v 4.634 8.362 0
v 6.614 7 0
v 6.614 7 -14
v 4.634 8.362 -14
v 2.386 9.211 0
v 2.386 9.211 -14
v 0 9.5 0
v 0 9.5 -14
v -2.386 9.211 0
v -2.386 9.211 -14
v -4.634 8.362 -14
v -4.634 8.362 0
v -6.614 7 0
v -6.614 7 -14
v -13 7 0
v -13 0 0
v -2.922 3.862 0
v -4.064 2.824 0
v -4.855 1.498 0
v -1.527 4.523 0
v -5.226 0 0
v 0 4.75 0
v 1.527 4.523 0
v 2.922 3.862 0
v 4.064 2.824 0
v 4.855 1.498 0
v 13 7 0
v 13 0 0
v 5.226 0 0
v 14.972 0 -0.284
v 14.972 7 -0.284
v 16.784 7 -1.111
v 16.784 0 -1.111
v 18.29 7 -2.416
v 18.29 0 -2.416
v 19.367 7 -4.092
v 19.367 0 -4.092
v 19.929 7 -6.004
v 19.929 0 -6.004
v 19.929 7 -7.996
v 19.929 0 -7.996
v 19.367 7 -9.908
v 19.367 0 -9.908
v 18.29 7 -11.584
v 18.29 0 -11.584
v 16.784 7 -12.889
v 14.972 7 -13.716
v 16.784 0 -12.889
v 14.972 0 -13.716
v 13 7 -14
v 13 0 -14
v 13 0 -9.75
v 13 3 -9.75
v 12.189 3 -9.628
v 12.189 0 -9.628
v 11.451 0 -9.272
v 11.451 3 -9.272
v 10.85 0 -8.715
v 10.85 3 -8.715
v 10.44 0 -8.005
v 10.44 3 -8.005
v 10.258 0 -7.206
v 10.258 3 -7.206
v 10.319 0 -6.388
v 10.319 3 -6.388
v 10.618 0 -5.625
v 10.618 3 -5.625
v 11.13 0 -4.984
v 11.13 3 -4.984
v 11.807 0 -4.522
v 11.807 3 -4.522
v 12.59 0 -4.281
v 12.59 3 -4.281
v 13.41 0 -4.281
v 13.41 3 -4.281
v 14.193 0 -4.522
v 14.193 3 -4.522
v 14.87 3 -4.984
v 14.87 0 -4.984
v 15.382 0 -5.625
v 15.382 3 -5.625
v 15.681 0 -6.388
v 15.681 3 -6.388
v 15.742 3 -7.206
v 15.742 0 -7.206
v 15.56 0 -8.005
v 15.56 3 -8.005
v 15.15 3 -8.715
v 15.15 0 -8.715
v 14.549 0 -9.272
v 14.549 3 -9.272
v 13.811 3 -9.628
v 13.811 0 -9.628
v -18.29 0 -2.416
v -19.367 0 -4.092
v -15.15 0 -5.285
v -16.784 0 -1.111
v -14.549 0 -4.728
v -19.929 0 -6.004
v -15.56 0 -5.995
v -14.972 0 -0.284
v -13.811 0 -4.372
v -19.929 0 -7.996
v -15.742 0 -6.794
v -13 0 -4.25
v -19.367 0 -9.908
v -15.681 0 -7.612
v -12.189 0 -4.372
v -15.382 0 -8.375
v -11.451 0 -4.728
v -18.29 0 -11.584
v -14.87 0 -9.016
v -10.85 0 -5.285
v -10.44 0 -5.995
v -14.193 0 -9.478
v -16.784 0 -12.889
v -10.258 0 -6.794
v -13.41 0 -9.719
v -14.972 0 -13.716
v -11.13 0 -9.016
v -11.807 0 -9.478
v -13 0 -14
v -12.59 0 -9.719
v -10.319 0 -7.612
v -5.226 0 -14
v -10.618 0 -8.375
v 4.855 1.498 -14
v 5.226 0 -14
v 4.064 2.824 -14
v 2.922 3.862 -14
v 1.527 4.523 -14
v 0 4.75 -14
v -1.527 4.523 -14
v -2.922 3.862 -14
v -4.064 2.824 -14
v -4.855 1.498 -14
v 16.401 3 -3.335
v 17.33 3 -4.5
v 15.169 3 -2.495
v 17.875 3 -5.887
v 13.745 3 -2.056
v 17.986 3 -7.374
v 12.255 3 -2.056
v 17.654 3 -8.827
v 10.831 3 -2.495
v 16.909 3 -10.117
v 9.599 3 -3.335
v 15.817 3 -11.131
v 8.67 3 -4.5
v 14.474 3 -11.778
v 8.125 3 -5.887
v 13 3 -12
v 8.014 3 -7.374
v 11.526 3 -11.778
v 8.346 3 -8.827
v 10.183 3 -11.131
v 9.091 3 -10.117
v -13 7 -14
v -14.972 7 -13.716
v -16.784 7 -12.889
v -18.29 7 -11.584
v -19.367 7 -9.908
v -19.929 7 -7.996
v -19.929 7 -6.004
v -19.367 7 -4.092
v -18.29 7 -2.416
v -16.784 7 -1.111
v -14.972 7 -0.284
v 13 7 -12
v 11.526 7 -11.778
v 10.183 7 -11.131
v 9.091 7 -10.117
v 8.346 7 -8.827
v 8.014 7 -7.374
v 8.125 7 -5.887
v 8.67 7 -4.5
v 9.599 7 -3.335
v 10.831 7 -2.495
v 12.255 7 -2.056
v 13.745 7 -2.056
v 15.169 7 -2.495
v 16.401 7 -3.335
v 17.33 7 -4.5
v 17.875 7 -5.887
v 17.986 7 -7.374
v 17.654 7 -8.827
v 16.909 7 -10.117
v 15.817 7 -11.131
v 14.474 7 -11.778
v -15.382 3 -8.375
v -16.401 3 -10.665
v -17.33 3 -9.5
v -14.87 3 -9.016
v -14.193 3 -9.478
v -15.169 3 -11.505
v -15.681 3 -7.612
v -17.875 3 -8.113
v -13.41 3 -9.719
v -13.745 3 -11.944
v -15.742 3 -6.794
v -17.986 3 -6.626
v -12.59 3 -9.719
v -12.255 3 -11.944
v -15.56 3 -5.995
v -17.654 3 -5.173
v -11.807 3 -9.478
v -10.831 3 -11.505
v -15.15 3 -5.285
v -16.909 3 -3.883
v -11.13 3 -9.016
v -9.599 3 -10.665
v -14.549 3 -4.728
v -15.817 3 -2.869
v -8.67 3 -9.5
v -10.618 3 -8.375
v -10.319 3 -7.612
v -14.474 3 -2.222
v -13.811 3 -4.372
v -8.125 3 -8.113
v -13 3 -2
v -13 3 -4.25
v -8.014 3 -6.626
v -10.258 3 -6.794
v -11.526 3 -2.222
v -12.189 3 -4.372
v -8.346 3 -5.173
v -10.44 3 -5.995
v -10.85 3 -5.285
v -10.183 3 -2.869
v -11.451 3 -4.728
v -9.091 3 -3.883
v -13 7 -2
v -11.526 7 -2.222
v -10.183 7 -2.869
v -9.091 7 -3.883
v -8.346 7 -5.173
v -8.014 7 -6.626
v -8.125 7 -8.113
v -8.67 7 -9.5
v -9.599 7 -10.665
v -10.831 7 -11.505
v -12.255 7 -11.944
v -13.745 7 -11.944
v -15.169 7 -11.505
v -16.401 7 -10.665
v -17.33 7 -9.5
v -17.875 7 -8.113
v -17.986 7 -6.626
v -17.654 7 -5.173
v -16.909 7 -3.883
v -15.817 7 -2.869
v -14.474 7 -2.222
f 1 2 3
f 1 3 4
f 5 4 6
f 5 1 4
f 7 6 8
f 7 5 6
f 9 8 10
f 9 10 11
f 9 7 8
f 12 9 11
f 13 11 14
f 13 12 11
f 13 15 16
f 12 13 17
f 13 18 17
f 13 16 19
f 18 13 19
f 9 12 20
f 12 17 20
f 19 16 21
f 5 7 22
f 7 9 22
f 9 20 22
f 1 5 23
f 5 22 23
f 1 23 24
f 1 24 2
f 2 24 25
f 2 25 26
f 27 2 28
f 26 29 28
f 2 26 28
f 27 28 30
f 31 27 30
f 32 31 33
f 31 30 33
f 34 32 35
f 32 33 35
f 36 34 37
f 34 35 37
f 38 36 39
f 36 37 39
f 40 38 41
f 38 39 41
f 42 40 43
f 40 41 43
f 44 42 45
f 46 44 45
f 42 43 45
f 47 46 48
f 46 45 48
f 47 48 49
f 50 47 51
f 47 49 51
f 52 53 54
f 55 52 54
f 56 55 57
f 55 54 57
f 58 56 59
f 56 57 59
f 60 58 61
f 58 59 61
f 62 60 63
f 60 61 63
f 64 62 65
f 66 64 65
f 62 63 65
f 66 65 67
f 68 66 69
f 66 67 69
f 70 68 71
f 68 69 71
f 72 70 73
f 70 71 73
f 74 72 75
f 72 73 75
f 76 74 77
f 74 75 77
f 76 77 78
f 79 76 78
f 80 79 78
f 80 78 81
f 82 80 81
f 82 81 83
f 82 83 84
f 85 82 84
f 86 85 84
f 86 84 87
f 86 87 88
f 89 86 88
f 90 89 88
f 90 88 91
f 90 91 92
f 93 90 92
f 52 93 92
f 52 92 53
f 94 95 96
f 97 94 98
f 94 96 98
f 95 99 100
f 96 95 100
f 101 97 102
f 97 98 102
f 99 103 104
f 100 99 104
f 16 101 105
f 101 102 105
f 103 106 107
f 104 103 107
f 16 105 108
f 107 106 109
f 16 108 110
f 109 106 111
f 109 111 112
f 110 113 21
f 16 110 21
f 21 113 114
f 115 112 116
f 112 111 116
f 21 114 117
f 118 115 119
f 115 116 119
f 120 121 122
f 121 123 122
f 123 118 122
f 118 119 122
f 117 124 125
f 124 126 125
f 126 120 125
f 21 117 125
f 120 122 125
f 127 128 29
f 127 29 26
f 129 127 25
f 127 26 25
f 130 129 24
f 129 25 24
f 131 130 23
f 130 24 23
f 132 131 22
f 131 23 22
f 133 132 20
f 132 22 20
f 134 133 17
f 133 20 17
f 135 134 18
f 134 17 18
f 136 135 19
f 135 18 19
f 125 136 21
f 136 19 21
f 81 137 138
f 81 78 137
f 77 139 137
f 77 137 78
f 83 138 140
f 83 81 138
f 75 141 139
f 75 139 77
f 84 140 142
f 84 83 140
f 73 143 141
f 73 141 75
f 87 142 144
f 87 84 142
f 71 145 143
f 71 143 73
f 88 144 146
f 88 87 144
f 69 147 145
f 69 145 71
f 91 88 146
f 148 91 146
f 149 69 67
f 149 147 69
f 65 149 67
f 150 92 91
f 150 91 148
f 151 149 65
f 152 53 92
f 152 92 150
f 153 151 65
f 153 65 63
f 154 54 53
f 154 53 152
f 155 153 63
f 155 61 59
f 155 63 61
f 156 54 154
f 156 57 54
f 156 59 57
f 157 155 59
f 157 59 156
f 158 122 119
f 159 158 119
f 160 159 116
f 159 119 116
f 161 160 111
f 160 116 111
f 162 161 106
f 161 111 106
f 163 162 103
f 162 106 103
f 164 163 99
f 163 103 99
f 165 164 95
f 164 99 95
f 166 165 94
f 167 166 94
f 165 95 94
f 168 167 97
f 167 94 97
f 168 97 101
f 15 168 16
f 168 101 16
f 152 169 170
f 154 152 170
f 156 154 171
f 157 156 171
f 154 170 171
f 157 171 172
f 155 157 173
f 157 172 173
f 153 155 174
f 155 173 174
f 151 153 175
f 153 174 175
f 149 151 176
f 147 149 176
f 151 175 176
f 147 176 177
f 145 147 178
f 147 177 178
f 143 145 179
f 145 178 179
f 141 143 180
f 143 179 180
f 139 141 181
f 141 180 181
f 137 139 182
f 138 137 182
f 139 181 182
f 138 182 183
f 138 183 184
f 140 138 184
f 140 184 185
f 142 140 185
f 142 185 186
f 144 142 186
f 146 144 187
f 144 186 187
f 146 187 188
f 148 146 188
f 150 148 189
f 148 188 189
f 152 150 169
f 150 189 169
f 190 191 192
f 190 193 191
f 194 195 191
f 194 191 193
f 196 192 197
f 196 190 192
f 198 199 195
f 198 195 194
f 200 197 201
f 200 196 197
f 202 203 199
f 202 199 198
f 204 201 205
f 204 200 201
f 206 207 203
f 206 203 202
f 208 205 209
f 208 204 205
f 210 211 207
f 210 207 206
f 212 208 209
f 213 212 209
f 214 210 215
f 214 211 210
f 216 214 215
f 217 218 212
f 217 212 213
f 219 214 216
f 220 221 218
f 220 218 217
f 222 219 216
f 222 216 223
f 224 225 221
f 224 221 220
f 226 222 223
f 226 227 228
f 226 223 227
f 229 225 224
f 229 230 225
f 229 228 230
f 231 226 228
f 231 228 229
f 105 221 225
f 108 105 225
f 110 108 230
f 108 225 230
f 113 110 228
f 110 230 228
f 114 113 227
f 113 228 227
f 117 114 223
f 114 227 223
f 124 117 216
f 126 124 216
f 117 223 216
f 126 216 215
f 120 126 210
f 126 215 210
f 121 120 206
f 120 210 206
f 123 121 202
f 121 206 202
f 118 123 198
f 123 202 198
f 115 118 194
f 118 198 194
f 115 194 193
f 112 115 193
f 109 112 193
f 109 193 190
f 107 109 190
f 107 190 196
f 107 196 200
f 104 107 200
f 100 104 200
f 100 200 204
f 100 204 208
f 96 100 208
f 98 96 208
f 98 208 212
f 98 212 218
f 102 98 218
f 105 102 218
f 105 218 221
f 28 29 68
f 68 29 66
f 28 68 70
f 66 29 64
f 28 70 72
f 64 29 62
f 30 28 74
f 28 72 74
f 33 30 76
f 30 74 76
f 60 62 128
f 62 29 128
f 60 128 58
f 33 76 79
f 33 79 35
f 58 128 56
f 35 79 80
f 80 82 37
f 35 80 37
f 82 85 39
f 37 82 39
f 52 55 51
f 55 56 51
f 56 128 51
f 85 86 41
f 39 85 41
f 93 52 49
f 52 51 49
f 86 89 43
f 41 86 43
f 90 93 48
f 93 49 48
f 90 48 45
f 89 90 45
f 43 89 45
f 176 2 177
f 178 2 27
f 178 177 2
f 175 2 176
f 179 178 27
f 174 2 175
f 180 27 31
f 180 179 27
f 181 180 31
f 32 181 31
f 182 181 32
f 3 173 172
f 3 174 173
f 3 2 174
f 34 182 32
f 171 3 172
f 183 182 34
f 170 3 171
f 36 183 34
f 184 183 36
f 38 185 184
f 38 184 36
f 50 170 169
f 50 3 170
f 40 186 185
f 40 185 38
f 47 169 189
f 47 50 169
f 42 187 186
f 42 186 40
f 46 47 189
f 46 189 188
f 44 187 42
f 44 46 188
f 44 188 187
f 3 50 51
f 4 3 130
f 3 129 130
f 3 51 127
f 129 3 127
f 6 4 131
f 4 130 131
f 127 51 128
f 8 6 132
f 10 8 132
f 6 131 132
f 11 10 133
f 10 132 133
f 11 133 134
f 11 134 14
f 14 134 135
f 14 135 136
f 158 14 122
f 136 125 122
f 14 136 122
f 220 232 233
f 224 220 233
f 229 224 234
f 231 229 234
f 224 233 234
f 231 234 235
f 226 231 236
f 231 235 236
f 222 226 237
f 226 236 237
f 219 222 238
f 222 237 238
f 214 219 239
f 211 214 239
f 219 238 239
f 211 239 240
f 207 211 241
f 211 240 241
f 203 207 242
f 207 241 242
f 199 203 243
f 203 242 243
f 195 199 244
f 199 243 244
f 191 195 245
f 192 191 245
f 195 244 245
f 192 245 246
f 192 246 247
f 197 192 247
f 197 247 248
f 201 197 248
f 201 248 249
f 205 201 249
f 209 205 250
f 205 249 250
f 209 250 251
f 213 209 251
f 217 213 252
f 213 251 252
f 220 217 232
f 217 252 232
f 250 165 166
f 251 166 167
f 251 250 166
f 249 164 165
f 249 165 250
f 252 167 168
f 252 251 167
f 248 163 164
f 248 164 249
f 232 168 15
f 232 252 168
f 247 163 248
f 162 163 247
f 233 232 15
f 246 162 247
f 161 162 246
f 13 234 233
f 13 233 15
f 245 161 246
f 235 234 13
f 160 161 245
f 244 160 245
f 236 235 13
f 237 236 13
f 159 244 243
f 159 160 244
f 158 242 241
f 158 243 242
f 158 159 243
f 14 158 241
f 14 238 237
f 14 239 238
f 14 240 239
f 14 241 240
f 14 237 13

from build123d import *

# Parameters (mm, degrees)
BOSS_EXTRUDE1_DEPTH = 7
SKETCH2_R           = 2.75
CUT_EXTRUDE1_DEPTH  = 26.396850198
SKETCH3_R           = 5
CUT_EXTRUDE2_DEPTH  = 4
SKETCH4_R           = 5.25
CUT_EXTRUDE3_DEPTH  = 26.396850198
BOSS_EXTRUDE2_DEPTH = 14


with BuildPart() as part:
    # Sketch1 → Boss-Extrude1 (new body)
    with BuildSketch(Plane(origin=(0, 0, 0), x_dir=(1, 0, 0), z_dir=(0, 1, 0))):
        with BuildLine():
            Line((-13, 0), (13, 0))
            ThreePointArc((13, 0), (20, 7), (13, 14))
            Line((13, 14), (-13, 14))
            ThreePointArc((-13, 14), (-20, 7), (-13, 0))
        make_face()
    extrude(amount=BOSS_EXTRUDE1_DEPTH)

    # Sketch2 → Cut-Extrude1 (cut, through all)
    with BuildSketch(Plane(origin=(0, 7, 0), x_dir=(1, 0, 0), z_dir=(0, 1, 0))):
        with Locations(Location((-13, 7, 0), (0, 0, 270))):
            Circle(SKETCH2_R)
        with Locations(Location((13, 7, 0), (0, 0, 90))):
            Circle(SKETCH2_R)
    extrude(amount=-CUT_EXTRUDE1_DEPTH, mode=Mode.SUBTRACT)

    # Sketch3 → Cut-Extrude2 (cut)
    with BuildSketch(Plane(origin=(0, 7, 0), x_dir=(1, 0, 0), z_dir=(0, 1, 0))):
        with Locations(Location((-13, 7, 0), (0, 0, 270))):
            Circle(SKETCH3_R)
        with Locations(Location((13, 7, 0), (0, 0, 90))):
            Circle(SKETCH3_R)
    extrude(amount=-CUT_EXTRUDE2_DEPTH, mode=Mode.SUBTRACT)

    # Sketch4 → Cut-Extrude3 (cut, through all)
    with BuildSketch(Plane.XY):
        with Locations((0, -0.5)):
            Circle(SKETCH4_R)
    extrude(amount=-CUT_EXTRUDE3_DEPTH, mode=Mode.SUBTRACT)

    # Sketch5 → Boss-Extrude2 (add)
    with BuildSketch(Plane.XY):
        with BuildLine():
            Line((-6.614378278, 7), (6.614378278, 7))
            ThreePointArc((6.614378278, 7), (0, 9.5), (-6.614378278, 7))
        make_face()
    extrude(amount=-BOSS_EXTRUDE2_DEPTH)


solid = part.part
